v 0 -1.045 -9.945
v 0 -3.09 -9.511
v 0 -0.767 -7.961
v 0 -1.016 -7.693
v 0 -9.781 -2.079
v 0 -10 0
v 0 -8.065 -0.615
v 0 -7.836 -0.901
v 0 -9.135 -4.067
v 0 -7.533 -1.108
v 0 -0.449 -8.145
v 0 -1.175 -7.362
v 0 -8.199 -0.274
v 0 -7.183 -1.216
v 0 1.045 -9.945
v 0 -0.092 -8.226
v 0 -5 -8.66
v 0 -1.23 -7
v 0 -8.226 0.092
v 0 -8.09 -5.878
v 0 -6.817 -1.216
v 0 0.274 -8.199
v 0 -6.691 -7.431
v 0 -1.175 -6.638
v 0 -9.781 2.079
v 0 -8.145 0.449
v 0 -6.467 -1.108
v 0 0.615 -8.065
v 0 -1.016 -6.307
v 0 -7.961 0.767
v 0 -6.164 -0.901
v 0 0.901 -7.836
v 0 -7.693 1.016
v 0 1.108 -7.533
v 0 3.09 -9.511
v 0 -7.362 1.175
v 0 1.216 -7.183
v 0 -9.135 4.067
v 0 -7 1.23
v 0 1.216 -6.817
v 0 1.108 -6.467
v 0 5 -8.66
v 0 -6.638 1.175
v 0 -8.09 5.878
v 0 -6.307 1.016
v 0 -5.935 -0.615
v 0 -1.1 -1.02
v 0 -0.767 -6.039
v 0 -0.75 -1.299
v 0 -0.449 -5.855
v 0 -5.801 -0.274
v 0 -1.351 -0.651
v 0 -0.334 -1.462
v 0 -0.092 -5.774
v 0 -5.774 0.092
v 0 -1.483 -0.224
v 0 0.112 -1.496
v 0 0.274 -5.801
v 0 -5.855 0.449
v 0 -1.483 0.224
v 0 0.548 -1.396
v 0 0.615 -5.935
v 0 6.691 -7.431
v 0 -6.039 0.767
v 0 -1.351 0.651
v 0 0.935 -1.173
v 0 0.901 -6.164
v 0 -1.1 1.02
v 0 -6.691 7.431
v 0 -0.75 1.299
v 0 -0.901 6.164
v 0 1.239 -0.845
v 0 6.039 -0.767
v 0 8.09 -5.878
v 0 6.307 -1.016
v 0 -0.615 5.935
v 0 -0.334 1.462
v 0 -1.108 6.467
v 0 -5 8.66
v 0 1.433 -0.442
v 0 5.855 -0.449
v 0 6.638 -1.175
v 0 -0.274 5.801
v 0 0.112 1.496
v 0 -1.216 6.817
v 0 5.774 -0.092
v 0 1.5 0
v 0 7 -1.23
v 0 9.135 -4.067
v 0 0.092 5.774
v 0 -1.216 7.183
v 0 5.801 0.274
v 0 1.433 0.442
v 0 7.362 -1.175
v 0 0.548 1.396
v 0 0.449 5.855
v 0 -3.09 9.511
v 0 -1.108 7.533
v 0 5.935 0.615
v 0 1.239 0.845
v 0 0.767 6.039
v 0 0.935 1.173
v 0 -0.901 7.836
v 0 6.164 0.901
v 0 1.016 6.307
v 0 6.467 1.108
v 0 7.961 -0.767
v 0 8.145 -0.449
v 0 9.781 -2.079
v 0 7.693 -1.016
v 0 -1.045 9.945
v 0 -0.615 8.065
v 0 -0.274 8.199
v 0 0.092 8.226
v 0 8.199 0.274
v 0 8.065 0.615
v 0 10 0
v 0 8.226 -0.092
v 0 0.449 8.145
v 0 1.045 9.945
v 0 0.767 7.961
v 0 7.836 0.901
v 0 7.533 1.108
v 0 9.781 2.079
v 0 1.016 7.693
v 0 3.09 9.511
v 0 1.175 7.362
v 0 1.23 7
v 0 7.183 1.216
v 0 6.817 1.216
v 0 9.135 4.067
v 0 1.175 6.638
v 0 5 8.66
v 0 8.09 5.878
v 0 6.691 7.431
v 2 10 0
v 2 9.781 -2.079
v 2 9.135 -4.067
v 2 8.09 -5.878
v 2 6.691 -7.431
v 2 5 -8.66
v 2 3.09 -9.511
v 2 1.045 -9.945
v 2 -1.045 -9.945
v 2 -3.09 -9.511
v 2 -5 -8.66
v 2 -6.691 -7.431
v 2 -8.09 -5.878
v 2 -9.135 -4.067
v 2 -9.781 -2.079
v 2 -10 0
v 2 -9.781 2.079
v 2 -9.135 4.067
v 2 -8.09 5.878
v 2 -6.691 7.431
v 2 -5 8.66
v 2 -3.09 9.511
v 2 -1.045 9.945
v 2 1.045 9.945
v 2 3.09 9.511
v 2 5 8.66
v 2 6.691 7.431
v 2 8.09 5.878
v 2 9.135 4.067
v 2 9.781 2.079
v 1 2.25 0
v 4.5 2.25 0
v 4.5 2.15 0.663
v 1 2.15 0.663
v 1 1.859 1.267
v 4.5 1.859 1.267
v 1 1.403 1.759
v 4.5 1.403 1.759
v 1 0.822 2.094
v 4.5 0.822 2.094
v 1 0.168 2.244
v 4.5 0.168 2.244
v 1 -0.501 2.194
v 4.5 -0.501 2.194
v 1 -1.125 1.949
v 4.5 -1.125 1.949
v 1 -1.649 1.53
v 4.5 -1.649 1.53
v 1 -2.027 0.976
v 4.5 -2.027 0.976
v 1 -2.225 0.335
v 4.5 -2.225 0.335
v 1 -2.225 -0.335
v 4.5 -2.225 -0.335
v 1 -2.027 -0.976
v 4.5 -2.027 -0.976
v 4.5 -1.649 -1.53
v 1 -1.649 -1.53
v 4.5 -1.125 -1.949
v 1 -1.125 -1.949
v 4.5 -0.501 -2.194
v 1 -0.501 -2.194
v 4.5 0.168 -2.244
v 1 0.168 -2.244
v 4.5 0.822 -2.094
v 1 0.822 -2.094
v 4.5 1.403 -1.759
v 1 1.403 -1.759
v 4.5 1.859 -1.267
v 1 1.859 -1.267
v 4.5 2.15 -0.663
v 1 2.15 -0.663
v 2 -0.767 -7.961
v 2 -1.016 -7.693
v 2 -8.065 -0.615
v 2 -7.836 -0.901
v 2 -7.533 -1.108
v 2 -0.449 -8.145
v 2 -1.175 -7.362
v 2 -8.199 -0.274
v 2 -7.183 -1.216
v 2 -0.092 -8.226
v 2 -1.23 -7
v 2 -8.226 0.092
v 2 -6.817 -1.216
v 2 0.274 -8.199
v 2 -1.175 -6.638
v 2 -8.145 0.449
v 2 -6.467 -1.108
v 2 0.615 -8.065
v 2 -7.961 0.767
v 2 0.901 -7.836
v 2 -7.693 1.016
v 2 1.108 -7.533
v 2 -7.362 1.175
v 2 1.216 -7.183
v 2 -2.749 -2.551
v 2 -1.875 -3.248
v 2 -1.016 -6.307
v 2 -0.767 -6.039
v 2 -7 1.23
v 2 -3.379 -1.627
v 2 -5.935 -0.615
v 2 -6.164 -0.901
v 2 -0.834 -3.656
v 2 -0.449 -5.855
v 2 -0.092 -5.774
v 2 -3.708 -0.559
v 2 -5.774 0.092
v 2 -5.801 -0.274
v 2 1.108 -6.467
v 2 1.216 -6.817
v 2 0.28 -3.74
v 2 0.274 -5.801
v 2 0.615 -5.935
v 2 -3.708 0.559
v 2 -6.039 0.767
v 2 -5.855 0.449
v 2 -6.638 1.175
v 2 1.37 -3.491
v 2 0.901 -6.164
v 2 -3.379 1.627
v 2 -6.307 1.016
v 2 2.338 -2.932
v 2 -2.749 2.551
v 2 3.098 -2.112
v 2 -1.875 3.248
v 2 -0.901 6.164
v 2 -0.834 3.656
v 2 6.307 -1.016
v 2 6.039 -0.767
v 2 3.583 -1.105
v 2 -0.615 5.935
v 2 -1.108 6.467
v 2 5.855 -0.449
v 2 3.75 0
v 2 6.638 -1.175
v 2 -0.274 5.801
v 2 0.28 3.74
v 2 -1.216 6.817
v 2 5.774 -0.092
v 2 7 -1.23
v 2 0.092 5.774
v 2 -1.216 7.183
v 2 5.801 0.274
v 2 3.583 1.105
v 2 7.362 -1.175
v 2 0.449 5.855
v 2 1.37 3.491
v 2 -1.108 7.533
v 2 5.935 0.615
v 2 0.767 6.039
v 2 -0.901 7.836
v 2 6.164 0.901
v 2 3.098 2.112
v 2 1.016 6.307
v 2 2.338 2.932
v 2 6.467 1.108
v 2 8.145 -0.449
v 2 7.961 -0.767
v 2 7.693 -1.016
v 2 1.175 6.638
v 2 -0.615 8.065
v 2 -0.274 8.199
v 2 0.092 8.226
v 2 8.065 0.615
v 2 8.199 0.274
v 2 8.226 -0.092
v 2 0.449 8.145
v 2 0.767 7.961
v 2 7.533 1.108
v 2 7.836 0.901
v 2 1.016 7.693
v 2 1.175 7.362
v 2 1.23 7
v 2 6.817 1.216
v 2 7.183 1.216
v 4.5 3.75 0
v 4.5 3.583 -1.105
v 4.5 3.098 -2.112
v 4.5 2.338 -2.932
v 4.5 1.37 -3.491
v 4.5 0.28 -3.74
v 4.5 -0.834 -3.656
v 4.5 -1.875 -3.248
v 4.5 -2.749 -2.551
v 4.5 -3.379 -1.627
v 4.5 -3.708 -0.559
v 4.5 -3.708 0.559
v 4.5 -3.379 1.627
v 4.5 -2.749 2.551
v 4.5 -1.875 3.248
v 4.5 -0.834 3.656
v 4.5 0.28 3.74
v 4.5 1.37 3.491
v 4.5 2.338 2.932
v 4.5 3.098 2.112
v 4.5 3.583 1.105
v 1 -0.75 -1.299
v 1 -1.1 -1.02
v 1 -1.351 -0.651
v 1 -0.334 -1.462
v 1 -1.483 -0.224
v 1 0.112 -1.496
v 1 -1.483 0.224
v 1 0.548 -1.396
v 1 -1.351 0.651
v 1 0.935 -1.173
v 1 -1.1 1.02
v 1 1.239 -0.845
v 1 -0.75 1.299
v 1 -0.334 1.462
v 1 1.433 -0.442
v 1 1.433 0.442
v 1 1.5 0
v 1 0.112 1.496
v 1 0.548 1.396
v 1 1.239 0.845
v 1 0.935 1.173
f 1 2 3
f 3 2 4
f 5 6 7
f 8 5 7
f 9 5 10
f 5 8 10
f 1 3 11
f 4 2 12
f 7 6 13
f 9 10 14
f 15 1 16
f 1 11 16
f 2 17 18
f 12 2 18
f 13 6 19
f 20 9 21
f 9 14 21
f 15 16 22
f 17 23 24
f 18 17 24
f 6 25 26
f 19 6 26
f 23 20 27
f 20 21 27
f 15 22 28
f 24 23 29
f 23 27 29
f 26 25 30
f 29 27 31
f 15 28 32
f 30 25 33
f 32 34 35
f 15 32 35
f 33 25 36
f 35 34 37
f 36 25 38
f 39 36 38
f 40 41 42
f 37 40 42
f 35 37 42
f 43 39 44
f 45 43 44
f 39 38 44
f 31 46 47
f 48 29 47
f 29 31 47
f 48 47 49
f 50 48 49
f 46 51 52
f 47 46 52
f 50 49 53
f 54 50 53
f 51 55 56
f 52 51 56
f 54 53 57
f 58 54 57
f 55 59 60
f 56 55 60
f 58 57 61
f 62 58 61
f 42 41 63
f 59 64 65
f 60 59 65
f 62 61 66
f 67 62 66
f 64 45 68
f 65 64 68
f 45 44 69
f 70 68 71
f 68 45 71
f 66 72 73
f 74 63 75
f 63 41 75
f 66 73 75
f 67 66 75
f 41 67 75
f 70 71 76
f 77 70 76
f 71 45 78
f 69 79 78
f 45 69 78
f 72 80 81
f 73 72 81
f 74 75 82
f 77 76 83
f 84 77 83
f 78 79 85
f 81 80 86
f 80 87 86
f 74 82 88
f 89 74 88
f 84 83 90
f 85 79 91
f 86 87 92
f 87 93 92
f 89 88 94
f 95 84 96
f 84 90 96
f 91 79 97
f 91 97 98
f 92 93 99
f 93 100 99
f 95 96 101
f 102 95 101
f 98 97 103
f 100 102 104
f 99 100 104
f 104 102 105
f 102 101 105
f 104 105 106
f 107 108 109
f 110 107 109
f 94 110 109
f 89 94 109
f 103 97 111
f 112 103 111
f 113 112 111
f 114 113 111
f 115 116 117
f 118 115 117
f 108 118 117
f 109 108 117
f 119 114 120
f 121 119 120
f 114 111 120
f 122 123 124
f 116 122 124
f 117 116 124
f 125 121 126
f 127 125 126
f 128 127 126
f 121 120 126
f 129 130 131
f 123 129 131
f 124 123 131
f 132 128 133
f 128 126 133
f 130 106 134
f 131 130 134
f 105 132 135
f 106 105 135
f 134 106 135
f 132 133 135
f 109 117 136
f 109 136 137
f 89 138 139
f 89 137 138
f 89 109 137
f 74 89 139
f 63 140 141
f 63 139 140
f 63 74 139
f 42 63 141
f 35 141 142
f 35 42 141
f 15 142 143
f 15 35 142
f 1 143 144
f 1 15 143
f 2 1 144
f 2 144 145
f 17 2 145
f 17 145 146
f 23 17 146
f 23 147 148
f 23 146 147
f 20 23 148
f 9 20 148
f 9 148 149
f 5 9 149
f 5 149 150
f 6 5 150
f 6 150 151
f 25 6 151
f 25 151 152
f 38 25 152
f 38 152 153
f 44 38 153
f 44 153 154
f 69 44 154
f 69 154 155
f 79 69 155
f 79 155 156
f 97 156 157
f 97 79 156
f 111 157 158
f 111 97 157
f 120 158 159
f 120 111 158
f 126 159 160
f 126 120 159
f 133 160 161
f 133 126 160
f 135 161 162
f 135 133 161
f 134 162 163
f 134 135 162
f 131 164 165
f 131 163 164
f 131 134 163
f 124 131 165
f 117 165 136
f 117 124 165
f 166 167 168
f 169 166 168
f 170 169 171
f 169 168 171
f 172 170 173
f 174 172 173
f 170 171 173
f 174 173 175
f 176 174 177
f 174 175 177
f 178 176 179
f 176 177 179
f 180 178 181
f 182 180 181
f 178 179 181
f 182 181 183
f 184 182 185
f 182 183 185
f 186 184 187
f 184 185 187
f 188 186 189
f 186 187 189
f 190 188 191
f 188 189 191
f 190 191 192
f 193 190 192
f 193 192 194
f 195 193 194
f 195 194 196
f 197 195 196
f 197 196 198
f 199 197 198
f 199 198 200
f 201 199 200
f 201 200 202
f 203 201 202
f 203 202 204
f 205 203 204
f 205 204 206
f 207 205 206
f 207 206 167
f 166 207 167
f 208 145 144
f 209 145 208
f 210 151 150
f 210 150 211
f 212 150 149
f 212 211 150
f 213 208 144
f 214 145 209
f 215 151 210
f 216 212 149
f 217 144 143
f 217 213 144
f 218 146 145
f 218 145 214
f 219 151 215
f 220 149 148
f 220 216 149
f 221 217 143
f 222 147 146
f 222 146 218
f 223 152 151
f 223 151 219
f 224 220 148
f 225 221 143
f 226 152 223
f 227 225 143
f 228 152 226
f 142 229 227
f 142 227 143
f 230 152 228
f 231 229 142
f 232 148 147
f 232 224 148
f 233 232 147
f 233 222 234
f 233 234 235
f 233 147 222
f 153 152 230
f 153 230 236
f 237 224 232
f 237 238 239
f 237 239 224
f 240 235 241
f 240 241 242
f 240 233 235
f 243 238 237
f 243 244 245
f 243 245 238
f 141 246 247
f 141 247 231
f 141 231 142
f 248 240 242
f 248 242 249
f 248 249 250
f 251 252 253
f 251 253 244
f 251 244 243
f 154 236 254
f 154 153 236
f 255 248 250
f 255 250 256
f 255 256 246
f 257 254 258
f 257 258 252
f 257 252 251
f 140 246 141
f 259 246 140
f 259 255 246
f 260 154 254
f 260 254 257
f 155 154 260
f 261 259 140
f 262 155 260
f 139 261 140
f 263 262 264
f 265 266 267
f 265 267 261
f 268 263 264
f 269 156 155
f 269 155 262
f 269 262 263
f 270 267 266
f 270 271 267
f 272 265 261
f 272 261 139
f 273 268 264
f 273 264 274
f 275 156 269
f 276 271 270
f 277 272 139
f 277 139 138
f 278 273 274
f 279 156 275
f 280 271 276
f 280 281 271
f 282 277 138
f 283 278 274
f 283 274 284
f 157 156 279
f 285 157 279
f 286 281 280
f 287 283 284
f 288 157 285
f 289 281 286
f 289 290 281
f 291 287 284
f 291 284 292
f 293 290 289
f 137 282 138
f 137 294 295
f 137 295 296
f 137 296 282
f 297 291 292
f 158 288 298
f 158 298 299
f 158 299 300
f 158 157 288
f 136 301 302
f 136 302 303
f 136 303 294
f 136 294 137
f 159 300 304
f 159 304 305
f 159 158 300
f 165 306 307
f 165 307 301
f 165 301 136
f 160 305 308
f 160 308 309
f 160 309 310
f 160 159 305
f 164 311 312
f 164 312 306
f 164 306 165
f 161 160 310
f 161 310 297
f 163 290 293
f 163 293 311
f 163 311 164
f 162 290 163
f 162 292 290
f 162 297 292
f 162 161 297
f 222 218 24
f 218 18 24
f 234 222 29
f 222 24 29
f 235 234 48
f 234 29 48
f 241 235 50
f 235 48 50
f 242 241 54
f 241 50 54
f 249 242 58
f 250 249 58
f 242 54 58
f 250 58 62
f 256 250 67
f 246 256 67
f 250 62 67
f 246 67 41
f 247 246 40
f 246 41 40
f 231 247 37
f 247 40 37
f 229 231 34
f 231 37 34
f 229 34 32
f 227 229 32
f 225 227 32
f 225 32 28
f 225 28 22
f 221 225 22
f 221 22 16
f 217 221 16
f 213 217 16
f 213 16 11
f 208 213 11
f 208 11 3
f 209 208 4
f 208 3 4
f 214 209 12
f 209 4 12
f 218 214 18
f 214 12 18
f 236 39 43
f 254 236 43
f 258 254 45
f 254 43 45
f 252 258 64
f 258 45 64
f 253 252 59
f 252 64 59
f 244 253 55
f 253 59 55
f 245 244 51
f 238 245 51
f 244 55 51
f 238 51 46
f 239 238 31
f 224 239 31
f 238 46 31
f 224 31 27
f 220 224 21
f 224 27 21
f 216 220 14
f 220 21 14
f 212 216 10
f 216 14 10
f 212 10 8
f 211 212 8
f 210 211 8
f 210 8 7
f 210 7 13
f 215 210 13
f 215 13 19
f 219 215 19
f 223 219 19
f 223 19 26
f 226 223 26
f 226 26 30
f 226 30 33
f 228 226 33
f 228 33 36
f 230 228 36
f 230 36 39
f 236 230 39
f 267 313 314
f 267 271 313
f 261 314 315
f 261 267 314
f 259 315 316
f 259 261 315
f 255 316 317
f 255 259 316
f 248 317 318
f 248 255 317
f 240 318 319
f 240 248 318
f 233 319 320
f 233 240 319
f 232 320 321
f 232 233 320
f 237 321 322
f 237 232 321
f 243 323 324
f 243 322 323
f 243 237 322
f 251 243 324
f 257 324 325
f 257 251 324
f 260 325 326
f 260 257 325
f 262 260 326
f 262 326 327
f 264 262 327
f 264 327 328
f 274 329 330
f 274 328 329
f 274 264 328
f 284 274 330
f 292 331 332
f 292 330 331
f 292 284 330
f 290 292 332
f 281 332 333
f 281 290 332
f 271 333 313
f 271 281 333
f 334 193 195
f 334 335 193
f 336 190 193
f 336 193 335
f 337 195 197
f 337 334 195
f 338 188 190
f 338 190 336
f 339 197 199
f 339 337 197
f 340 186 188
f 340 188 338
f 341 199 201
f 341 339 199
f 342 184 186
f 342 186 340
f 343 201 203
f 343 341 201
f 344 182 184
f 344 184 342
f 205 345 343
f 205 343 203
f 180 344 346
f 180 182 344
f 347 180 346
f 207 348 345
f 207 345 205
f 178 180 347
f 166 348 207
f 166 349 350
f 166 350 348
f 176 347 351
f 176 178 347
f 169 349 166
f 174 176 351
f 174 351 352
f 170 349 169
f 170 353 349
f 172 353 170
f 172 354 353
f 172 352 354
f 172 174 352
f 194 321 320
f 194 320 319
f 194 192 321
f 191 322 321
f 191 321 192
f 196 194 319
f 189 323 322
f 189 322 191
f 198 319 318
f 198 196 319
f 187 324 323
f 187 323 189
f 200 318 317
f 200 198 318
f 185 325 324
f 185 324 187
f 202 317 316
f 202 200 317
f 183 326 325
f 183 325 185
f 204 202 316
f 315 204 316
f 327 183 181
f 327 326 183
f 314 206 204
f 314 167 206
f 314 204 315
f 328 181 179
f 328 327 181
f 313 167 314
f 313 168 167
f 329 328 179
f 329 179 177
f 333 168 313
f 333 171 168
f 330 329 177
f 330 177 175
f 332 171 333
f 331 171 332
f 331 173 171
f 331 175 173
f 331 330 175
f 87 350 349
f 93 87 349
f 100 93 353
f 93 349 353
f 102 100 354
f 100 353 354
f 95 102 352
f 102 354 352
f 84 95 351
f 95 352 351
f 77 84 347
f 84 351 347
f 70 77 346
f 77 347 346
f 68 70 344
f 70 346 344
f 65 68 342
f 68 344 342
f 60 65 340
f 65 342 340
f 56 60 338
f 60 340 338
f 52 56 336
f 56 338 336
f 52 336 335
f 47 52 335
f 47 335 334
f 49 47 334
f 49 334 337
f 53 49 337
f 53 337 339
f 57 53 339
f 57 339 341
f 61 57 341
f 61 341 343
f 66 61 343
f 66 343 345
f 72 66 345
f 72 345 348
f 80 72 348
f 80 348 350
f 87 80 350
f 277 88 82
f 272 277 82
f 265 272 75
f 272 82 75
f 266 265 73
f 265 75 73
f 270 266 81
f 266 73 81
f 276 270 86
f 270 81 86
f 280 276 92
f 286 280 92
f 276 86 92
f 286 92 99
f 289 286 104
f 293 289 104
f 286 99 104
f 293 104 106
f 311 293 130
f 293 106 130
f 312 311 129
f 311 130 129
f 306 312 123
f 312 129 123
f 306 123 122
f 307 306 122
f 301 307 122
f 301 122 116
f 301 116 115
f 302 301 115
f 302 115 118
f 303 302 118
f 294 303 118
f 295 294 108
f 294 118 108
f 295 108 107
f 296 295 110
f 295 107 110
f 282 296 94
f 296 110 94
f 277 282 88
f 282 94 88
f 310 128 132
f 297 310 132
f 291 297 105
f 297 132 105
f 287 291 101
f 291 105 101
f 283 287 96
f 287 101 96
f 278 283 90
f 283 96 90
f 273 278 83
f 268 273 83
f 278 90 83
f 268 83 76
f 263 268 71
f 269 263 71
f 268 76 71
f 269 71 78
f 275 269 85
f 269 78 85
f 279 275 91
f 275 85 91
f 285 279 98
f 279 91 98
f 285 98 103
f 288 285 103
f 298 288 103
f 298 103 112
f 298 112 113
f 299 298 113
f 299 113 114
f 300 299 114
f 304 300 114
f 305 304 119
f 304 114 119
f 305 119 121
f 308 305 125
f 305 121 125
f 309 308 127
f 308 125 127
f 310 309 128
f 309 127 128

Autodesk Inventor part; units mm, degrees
ref_plane "YZ Plane" through (0, 0, 0) normal (1, 0, 0) x (0, 1, 0)
ref_plane "XZ Plane" through (0, 0, 0) normal (0, 1, 0) x (-1, 0, 0)
ref_plane "XY Plane" through (0, 0, 0) normal (0, 0, 1) x (1, 0, 0)
sketch "Skizze1" plane through (0, 0, 0) normal (0, 0, 1) x (1, 0, 0)
  line L0 (0, 0) -> (4.5, 0)
  line L1 (0, 1.5) -> (1, 1.5)
  line L2 (1, 1.5) -> (1, 2.25)
  line L3 (1, 2.25) -> (4.5, 2.25)
  line L4 (4.5, 2.25) -> (4.5, 3.75)
  line L5 (4.5, 3.75) -> (2, 3.75)
  line L6 (2, 3.75) -> (2, 10)
  line L7 (2, 10) -> (0, 10)
  line L8 (0, 10) -> (0, 1.5)
  point P0 (0.5, 1.5)
  dimension "d0" = 4.5
  dimension "d1" = 3
  dimension "d2" = 1
  dimension "d3" = 7.5
  dimension "d4" = 4.5
  dimension "d5" = 2
  dimension "d6" = 20
revolve "Umdrehung1" add sketch "Skizze1" angle 360 about axis through (0, 0, 0) along (1, 0, 0)
sketch "Skizze2" plane through (2, 0, 0) normal (1, 0, 0) x (0, 0, -1)
  point P0 (0, 0)
  point P1 (0, 7)
  dimension "d8" = 7
hole "Bohrung1" at (2, 7, 0) direction (-1, 0, 0) diameter 2.459 end through all thread size "M3x0.5" class "6H" standard "ISO Metric profile"
pattern_circular "Runde Anordnung1" count 4 over 360 about axis through (2.75, 0, 0) along (1, 0, 0) of "Bohrung1"
properties part number "Motor Adapter"
